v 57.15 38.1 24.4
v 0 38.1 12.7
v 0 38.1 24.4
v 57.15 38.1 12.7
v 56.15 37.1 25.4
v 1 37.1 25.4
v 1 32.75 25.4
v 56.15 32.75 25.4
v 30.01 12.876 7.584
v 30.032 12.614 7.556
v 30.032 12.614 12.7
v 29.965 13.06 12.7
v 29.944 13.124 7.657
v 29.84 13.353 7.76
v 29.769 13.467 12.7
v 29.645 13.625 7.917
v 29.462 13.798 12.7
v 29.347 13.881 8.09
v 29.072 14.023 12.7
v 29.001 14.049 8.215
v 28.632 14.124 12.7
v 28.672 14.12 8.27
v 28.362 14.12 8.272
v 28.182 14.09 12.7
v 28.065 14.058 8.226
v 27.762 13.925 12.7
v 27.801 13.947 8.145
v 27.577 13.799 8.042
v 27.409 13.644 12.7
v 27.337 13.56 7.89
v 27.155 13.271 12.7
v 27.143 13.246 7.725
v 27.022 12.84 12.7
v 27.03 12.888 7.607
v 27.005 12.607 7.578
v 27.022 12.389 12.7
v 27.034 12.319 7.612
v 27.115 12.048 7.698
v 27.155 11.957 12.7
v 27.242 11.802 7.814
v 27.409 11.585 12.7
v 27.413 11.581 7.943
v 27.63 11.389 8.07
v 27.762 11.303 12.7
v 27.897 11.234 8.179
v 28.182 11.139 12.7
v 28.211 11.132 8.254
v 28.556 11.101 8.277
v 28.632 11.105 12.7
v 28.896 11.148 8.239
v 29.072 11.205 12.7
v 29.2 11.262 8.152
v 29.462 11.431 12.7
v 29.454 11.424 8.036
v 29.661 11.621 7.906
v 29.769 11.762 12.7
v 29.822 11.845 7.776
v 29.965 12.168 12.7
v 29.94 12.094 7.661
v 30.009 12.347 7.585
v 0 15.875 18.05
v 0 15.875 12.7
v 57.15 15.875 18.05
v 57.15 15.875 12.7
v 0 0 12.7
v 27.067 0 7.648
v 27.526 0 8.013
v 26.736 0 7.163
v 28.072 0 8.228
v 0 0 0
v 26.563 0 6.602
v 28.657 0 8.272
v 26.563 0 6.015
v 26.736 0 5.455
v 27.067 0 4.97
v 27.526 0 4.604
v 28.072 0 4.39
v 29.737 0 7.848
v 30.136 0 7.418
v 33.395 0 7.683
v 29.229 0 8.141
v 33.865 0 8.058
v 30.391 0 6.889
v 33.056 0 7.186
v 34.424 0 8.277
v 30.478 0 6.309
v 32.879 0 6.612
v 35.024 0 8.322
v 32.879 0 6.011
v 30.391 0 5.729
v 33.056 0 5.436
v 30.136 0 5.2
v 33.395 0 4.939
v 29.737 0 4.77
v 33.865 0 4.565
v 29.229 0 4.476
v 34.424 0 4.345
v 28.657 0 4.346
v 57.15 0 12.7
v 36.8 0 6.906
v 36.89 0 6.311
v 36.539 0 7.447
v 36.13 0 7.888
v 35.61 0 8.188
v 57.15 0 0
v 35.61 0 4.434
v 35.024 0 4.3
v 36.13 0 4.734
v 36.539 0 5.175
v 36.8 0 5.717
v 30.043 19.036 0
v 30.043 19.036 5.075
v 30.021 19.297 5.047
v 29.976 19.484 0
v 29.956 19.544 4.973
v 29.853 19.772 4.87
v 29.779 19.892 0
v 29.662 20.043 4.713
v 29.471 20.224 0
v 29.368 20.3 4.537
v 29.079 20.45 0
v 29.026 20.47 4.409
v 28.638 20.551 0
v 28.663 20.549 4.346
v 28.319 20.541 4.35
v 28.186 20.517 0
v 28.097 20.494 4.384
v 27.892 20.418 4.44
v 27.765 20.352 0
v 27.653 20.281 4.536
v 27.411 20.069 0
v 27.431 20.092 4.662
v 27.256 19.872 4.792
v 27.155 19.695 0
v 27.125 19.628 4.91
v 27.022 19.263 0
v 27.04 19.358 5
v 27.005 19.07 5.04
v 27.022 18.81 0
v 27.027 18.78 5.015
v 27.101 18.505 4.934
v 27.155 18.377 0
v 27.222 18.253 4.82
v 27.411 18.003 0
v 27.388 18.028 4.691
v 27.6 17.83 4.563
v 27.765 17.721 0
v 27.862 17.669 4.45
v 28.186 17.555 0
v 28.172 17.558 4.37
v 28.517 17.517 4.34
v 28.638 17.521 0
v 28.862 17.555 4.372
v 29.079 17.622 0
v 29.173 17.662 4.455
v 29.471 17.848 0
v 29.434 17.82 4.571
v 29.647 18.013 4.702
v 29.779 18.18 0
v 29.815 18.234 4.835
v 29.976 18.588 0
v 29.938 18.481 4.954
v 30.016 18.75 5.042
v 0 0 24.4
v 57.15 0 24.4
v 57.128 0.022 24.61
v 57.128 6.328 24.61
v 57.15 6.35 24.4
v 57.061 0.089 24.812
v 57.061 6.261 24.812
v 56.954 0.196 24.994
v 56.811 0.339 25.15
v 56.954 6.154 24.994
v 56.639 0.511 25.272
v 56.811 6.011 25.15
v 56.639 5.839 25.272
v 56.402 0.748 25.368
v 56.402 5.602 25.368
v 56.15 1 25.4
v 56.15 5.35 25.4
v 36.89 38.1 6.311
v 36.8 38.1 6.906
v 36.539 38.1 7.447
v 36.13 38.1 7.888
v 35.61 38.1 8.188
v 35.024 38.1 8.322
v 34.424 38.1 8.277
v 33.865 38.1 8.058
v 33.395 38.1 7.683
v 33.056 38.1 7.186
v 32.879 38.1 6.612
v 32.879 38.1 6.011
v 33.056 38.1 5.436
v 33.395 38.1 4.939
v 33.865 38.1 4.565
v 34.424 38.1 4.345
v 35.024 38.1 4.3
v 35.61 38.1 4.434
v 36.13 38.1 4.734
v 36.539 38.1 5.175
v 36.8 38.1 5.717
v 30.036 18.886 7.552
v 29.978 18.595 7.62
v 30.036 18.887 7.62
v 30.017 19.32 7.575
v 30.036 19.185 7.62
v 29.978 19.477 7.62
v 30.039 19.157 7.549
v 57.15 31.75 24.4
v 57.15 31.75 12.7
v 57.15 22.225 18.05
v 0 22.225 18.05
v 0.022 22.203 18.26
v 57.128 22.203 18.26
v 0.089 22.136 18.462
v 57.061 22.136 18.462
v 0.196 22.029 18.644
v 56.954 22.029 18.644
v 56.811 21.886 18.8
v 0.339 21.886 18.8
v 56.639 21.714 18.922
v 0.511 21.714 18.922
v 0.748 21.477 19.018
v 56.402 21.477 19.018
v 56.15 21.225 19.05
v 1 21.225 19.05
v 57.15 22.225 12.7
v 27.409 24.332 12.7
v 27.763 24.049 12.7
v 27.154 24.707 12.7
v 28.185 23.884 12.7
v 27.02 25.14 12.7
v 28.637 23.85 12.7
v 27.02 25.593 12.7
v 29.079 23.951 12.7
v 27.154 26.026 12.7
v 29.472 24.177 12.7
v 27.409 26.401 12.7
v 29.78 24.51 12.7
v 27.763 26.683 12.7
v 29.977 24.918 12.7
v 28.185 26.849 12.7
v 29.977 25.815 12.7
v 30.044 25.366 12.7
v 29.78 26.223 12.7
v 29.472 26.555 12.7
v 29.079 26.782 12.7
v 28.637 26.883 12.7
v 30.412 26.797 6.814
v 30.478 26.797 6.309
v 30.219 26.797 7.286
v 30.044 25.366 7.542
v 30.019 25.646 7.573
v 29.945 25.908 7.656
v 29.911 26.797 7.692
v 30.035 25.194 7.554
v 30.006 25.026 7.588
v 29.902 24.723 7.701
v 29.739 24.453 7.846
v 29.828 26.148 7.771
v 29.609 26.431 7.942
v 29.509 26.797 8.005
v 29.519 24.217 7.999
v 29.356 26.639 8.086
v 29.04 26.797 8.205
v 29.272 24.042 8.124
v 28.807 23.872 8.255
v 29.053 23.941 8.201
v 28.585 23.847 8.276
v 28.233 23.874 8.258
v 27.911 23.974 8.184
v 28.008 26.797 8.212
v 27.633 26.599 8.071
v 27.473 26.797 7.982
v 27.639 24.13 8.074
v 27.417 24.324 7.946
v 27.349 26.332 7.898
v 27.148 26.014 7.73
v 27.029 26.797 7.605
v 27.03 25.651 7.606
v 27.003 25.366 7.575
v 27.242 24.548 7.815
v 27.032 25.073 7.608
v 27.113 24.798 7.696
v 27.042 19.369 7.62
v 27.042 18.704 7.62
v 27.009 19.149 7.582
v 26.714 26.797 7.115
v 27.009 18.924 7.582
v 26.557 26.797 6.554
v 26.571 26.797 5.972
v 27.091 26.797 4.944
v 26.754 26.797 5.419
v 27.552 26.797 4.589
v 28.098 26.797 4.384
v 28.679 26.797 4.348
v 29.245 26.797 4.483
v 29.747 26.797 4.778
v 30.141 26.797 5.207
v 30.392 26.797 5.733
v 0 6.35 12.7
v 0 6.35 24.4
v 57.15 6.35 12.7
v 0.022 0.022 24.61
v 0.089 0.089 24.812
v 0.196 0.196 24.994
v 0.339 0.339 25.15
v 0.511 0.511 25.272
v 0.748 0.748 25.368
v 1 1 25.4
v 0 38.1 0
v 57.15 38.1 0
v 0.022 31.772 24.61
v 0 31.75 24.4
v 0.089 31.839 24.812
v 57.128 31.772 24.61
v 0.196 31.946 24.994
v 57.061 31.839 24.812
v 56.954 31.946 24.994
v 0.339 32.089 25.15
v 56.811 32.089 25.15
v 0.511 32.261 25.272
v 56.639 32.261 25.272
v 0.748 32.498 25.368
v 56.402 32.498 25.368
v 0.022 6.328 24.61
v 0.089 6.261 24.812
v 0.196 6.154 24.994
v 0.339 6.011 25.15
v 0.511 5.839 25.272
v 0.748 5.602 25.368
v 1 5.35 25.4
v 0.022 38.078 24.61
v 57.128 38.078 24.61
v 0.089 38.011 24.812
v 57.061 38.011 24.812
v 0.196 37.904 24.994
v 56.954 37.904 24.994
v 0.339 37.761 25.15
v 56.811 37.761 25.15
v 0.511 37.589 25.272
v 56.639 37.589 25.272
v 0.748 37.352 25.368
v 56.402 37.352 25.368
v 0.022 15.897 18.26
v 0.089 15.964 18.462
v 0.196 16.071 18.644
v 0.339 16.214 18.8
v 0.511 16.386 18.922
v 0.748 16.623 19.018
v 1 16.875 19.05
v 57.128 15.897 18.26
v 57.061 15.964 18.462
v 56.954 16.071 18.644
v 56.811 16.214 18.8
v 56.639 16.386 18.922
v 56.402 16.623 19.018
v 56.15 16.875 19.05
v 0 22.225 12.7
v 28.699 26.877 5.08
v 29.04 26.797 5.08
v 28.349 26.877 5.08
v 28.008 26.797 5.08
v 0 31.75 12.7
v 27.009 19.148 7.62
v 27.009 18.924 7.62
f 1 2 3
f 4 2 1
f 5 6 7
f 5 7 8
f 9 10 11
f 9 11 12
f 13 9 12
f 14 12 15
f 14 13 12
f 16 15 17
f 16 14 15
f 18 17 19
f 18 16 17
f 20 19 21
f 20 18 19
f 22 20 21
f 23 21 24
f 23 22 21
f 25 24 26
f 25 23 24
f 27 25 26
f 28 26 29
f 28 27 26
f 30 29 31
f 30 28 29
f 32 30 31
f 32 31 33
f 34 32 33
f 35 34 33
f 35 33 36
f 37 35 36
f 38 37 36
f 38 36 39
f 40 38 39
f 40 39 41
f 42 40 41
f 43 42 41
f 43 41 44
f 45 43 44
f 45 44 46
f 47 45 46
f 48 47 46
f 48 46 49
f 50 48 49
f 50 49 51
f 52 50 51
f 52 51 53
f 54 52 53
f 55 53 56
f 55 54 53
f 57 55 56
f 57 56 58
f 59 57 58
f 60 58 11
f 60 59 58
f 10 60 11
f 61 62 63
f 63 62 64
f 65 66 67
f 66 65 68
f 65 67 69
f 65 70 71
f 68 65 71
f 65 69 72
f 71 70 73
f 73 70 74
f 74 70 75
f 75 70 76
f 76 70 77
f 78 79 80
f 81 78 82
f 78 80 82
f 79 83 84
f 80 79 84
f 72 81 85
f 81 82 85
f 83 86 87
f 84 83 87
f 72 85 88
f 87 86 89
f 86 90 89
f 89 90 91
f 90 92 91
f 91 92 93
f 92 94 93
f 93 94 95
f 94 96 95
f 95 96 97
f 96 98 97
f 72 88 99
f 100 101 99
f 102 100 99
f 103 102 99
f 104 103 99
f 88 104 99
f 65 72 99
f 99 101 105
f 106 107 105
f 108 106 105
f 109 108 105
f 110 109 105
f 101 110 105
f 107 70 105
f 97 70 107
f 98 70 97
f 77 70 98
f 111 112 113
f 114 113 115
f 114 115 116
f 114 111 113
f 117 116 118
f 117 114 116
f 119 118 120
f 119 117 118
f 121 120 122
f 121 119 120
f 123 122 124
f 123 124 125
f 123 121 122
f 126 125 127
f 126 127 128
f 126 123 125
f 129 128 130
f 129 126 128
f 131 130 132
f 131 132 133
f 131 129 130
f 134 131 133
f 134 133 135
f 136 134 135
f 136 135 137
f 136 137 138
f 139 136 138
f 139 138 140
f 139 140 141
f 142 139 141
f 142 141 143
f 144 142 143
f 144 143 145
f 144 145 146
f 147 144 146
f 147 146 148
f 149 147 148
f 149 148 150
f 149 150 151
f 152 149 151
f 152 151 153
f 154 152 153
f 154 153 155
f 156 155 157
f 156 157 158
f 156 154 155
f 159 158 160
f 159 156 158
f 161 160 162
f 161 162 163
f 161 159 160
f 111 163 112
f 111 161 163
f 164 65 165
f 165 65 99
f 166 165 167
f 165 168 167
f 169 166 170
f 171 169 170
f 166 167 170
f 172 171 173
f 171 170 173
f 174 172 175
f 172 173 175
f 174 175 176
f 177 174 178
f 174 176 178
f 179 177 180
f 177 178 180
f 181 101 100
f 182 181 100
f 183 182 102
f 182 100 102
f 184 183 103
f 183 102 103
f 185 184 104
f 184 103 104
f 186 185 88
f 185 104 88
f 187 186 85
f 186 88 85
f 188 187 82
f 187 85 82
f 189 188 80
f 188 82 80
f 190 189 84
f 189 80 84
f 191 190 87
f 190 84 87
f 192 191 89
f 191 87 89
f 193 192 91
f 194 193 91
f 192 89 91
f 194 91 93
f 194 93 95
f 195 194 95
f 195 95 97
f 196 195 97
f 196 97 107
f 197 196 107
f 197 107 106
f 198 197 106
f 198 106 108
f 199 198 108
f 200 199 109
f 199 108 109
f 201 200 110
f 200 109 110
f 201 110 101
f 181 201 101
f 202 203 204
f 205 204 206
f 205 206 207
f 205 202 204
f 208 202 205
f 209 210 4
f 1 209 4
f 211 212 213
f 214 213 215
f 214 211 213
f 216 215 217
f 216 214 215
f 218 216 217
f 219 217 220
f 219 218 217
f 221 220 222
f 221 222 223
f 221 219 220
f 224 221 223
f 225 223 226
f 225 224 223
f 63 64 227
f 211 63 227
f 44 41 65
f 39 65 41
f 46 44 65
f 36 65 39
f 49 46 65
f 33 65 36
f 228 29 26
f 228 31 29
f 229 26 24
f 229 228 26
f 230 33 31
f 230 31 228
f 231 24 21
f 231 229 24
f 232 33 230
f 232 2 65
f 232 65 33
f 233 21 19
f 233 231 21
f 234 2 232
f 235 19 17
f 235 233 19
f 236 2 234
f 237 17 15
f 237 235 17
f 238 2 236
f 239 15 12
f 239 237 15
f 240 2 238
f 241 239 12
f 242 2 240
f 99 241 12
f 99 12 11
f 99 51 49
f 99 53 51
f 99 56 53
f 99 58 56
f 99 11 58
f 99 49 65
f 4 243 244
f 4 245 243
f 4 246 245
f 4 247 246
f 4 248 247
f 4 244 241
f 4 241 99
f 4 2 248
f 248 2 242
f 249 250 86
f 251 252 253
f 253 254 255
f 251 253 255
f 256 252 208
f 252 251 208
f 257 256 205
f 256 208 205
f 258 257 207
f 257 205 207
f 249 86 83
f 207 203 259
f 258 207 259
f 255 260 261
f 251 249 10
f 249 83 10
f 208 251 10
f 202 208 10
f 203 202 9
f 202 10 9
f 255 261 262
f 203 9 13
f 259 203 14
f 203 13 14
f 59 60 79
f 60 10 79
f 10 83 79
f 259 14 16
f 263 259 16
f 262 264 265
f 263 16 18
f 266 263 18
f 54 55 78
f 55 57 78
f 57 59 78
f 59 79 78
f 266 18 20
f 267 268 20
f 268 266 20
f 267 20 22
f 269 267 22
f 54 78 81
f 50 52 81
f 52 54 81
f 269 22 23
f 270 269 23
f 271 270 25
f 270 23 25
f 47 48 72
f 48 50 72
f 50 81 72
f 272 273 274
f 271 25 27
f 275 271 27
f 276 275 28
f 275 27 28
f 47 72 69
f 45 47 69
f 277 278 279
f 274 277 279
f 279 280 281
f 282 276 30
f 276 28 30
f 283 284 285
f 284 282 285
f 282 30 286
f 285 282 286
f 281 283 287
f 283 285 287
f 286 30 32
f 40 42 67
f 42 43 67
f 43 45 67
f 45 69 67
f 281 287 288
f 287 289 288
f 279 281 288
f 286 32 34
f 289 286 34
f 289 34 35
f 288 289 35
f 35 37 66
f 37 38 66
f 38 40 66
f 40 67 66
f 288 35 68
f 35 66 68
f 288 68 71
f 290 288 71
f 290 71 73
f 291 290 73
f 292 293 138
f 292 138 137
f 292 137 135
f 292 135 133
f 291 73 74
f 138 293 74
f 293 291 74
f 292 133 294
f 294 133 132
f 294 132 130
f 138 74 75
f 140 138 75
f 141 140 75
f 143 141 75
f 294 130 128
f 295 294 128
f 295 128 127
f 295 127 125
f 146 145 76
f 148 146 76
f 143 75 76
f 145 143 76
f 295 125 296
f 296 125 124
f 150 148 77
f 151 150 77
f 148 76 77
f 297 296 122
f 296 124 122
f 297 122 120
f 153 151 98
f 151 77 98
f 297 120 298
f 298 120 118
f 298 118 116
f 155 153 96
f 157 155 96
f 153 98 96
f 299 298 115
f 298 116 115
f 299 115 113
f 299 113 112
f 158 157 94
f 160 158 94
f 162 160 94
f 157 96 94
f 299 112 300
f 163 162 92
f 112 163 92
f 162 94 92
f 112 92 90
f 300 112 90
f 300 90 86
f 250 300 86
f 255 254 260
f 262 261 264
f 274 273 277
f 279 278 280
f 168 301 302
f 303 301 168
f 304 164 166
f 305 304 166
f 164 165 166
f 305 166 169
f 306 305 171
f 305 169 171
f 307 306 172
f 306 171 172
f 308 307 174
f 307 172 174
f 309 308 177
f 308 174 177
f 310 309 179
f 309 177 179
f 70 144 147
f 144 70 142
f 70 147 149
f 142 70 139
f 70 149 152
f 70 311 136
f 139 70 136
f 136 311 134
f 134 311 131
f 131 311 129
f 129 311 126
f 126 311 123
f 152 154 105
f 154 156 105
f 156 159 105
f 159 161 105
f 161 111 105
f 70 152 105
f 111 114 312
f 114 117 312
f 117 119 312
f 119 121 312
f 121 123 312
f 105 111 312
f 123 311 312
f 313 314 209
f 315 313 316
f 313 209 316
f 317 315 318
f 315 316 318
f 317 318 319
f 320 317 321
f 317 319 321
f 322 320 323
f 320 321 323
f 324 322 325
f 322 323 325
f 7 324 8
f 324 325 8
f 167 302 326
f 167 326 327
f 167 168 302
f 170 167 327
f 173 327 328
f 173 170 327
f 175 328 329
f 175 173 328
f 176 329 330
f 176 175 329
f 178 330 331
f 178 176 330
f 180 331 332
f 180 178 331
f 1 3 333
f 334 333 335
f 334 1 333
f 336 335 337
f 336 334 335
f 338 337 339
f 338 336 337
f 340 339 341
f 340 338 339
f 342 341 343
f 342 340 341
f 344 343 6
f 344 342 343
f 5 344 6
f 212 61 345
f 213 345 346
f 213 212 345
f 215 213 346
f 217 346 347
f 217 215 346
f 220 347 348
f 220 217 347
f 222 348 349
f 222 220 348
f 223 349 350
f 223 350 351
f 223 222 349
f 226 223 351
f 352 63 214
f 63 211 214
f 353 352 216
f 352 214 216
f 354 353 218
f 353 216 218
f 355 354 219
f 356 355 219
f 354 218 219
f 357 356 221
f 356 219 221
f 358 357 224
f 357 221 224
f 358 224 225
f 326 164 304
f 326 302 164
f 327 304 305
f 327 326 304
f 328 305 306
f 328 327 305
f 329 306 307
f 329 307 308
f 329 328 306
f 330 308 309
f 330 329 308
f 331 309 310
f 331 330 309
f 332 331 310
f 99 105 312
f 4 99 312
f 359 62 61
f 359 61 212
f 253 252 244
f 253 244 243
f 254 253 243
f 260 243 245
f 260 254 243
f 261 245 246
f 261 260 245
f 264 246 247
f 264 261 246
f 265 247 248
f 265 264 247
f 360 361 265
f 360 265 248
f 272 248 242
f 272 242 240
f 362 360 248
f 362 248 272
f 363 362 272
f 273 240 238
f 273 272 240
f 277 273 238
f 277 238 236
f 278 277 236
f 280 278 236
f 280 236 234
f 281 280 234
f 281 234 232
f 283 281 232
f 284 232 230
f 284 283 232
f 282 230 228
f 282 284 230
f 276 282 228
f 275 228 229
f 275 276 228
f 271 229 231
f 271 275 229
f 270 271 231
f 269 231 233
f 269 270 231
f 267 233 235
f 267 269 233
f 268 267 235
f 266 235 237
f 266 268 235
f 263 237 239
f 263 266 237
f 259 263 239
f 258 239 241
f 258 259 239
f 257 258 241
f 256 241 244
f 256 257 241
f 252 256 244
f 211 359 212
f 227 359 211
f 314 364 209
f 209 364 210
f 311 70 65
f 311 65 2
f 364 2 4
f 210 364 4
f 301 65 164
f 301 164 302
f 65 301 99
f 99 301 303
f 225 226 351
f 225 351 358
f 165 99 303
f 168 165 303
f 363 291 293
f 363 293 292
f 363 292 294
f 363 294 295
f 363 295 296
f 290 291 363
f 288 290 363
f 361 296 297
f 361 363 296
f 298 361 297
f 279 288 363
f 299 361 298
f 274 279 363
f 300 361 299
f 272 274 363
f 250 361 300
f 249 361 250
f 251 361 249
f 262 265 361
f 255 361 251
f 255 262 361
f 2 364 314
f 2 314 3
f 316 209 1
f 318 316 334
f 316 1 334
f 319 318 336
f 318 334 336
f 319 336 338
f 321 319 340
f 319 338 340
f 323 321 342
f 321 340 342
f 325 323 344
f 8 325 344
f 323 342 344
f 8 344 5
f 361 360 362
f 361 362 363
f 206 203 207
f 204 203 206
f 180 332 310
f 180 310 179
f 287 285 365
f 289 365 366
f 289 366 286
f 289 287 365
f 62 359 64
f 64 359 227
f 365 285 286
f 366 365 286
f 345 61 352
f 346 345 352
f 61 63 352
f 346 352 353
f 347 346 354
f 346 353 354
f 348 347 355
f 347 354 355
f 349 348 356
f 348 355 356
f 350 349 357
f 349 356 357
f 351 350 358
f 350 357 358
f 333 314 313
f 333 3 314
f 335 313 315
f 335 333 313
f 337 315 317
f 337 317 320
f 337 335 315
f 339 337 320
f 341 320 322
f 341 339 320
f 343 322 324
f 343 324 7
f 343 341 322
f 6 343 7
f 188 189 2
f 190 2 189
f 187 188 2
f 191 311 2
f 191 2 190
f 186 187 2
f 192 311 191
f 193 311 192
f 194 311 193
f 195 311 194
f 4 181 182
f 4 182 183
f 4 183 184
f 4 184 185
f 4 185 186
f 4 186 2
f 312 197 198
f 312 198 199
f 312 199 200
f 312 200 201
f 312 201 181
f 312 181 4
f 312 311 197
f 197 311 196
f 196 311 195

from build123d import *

# Parameters (mm, degrees)
BOX001_W     = 57.15
BOX001_H     = 6.35
BOX001_DEPTH = 12.7
FILLET_R     = 1
BOX002_W     = 57.15
BOX002_H     = 6.35
BOX002_DEPTH = 12.7
FILLET001_R  = 1
BOX003_W     = 57.15
BOX003_H     = 6.35
BOX003_DEPTH = 6.35
FILLET002_R  = 1
SKETCH005_R  = 2.01665
PAD004_DEPTH = 38.1
SKETCH002_R  = 1.968415
PAD001_DEPTH = 26.797
SKETCH004_R  = 1.520745
PAD003_DEPTH = 7.62
SKETCH003_R  = 1.513596
PAD002_DEPTH = 7.62
SKETCH001_R  = 1.519201
PAD_DEPTH    = 7.62
BOX_W        = 57.15
BOX_H        = 38.1
BOX_DEPTH    = 12.7


with BuildPart() as fillet_body:
    # Box001 → Box001 (new body)
    with BuildSketch(Plane.XY.offset(12.7)):
        with Locations((28.575, 3.175)):
            Rectangle(BOX001_W, BOX001_H)
    extrude(amount=BOX001_DEPTH)

    # Fillet
    fillet_edges = [fillet_body.edges().sort_by_distance(p)[0] for p in [
        (0, 3.175, 25.4),
        (57.15, 3.175, 25.4),
        (28.575, 0, 25.4),
        (28.575, 6.35, 25.4),
    ]]
    fillet(fillet_edges, radius=FILLET_R)


with BuildPart() as fillet001:
    # Box002 → Box002 (new body)
    with BuildSketch(Plane(origin=(0, 31.75, 12.7), x_dir=(1, 0, 0), z_dir=(0, 0, 1))):
        with Locations((28.575, 3.175)):
            Rectangle(BOX002_W, BOX002_H)
    extrude(amount=BOX002_DEPTH)

    # Fillet001
    fillet001_edges = [fillet001.edges().sort_by_distance(p)[0] for p in [
        (0, 34.925, 25.4),
        (57.15, 34.925, 25.4),
        (28.575, 31.75, 25.4),
        (28.575, 38.1, 25.4),
    ]]
    fillet(fillet001_edges, radius=FILLET001_R)


with BuildPart() as fillet002:
    # Box003 → Box003 (new body)
    with BuildSketch(Plane(origin=(0, 15.875, 12.7), x_dir=(1, 0, 0), z_dir=(0, 0, 1))):
        with Locations((28.575, 3.175)):
            Rectangle(BOX003_W, BOX003_H)
    extrude(amount=BOX003_DEPTH)

    # Fillet002
    fillet002_edges = [fillet002.edges().sort_by_distance(p)[0] for p in [
        (0, 19.05, 19.05),
        (57.15, 19.05, 19.05),
        (28.575, 15.875, 19.05),
        (28.575, 22.225, 19.05),
    ]]
    fillet(fillet002_edges, radius=FILLET002_R)


with BuildPart() as pad004:
    # Sketch005 → Pad004 (new body)
    with BuildSketch(Plane.XZ):
        with Locations((34.873043, 6.31109)):
            Circle(SKETCH005_R)
    extrude(amount=-PAD004_DEPTH)


with BuildPart() as pad001:
    # Sketch002 → Pad001 (new body)
    with BuildSketch(Plane.XZ):
        with Locations((28.509926, 6.30875)):
            Circle(SKETCH002_R)
    extrude(amount=-PAD001_DEPTH)


with BuildPart() as pad003:
    # Sketch004 → Pad003 (new body)
    with BuildSketch(Plane.XY.offset(5.08)):
        with Locations((28.523685, 25.366407)):
            Circle(SKETCH004_R)
    extrude(amount=PAD003_DEPTH)


with BuildPart() as fusion:
    # Sketch003 → Pad002 (new body)
    with BuildSketch(Plane.XY.offset(5.08)):
        with Locations((28.518757, 12.614189)):
            Circle(SKETCH003_R)
    extrude(amount=PAD002_DEPTH)

    # Fusion: union Pad001, Pad003
    add(pad001.part)
    add(pad003.part)


with BuildPart() as pad:
    # Sketch001 → Pad (new body)
    with BuildSketch(Plane.XY):
        with Locations((28.524174, 19.036169)):
            Circle(SKETCH001_R)
    extrude(amount=PAD_DEPTH)


with BuildPart() as fusion001:
    # Fusion001 base: copy of Pad
    add(pad.part)

    # Fusion001: union Fusion
    add(fusion.part)


with BuildPart() as cut002:
    # Box → Box (new body)
    with BuildSketch(Plane.XY):
        with Locations((28.575, 19.05)):
            Rectangle(BOX_W, BOX_H)
    extrude(amount=BOX_DEPTH)

    # Cut: cut Pad
    add(pad.part, mode=Mode.SUBTRACT)

    # Cut001: cut Fusion001
    add(fusion001.part, mode=Mode.SUBTRACT)

    # Cut002: cut Pad004
    add(pad004.part, mode=Mode.SUBTRACT)


solid = Compound([fillet_body.part, fillet001.part, fillet002.part, cut002.part])
